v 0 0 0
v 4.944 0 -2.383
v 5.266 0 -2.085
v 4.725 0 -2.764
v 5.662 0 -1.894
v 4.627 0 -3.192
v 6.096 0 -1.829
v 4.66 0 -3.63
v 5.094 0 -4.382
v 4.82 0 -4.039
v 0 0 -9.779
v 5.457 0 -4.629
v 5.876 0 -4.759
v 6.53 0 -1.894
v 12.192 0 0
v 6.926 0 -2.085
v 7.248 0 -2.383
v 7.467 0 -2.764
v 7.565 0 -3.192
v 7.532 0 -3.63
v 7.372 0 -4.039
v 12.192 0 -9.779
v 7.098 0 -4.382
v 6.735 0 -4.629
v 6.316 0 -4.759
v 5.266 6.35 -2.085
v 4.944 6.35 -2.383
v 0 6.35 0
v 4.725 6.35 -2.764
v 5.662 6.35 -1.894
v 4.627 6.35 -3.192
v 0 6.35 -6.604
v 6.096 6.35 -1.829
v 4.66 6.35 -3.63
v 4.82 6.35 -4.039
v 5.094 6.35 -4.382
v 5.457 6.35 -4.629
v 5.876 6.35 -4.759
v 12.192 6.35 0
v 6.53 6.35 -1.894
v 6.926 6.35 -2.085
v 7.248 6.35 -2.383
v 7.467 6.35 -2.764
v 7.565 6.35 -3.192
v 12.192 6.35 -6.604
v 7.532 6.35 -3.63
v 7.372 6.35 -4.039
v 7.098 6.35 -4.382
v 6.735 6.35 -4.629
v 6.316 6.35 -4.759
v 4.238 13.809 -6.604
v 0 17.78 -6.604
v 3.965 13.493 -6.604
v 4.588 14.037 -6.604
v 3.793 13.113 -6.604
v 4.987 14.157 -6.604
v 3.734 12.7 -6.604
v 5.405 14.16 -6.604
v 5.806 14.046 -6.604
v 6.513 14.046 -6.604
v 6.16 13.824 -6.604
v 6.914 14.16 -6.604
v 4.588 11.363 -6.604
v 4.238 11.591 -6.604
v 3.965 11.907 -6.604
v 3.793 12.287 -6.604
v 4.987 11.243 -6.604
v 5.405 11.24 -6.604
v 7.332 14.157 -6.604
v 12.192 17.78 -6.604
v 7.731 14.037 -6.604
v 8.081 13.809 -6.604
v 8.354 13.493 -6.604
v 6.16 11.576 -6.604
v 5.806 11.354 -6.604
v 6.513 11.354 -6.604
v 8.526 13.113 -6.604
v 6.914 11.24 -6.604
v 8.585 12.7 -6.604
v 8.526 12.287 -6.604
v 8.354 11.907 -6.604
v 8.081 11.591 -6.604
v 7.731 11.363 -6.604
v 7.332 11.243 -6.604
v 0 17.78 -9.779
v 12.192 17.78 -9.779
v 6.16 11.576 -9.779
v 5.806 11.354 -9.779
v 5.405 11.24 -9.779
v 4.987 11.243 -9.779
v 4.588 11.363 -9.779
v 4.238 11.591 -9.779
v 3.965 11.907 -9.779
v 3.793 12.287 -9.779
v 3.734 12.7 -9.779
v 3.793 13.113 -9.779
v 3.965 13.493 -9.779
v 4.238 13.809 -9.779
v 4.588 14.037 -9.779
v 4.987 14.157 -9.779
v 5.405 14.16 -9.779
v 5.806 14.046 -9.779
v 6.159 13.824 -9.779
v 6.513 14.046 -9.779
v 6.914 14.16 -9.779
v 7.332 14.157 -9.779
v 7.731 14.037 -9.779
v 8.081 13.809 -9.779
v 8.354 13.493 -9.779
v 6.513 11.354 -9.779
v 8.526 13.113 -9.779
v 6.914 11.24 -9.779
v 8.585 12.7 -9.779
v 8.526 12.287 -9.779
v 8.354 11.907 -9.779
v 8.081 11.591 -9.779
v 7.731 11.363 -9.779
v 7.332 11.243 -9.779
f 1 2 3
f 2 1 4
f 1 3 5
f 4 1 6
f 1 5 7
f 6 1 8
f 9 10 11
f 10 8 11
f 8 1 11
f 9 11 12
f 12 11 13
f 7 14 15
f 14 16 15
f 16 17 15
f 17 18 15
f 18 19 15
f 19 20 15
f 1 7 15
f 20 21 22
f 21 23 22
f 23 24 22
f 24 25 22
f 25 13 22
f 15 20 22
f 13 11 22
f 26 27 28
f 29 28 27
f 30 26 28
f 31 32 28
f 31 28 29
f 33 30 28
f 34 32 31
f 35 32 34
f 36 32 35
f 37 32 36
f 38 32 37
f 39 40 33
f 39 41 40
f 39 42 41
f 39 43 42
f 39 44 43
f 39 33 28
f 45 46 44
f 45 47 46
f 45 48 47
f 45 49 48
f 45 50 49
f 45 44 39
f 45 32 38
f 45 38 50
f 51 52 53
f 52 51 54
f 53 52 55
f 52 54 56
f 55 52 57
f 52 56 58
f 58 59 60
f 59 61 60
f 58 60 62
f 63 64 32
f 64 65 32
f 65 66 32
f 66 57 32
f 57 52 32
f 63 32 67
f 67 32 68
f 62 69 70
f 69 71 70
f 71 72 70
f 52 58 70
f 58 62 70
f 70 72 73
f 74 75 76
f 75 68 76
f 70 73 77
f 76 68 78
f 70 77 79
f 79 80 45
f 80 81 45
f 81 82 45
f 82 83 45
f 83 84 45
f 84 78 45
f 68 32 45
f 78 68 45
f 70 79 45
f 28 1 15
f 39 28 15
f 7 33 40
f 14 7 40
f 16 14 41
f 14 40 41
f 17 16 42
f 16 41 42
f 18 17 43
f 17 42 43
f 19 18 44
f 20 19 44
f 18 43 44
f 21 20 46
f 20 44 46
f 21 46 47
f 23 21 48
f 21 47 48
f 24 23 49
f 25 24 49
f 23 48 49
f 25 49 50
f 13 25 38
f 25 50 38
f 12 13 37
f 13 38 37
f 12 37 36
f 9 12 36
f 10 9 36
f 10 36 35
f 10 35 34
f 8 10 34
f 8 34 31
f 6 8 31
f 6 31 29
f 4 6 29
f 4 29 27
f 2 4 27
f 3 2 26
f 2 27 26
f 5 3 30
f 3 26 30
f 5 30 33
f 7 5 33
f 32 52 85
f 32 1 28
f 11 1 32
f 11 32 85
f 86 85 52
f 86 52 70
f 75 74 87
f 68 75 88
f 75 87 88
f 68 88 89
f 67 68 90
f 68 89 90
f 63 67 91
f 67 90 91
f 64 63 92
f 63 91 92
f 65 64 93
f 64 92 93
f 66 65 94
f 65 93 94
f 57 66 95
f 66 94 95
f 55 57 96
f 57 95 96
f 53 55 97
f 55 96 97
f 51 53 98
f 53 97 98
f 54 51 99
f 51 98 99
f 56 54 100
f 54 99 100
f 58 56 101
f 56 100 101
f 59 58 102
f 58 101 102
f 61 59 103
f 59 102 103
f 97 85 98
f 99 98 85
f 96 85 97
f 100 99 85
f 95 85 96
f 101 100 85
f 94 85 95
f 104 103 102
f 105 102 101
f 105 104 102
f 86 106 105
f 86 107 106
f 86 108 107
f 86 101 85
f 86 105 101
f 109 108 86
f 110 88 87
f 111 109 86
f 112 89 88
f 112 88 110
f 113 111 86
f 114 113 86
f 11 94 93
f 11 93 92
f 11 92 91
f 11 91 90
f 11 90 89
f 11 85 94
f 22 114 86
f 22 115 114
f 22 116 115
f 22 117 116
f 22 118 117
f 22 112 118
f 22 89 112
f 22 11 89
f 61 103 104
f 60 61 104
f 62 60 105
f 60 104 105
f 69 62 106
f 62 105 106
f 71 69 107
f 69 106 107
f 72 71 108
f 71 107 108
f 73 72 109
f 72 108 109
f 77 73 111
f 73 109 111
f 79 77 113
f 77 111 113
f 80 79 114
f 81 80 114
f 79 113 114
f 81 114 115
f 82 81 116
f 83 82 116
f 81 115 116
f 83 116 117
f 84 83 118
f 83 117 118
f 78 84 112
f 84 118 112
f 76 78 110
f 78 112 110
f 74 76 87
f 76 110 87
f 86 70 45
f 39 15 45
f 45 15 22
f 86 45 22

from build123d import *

# Parameters (mm, degrees)
SKETCH1_W           = 12.192
SKETCH1_H           = 9.779
BOSS_EXTRUDE1_DEPTH = 6.35
SKETCH2_W           = 12.192
SKETCH2_H           = 3.175
BOSS_EXTRUDE2_DEPTH = 11.43
SKETCH3_R           = 1.4732
CUT_EXTRUDE2_DEPTH  = 6.35
SKETCH4_R           = 1.4732
CUT_EXTRUDE3_DEPTH  = 6.35
SKETCH5_R           = 1.4732
CUT_EXTRUDE4_DEPTH  = 6.35


with BuildPart() as part:
    # Sketch1 → Boss-Extrude1 (new body)
    with BuildSketch(Plane(origin=(0, 0, 0), x_dir=(1, 0, 0), z_dir=(0, 1, 0))):
        with Locations((6.096, 4.8895)):
            Rectangle(SKETCH1_W, SKETCH1_H)
    extrude(amount=BOSS_EXTRUDE1_DEPTH)

    # Sketch2 → Boss-Extrude2 (add)
    with BuildSketch(Plane(origin=(0, 6.35, 0), x_dir=(1, 0, 0), z_dir=(0, 1, 0))):
        with Locations((6.096, 8.1915)):
            Rectangle(SKETCH2_W, SKETCH2_H)
    extrude(amount=BOSS_EXTRUDE2_DEPTH)

    # Sketch3 → Cut-Extrude2 (cut)
    with BuildSketch(Plane(origin=(0, 6.35, 0), x_dir=(1, 0, 0), z_dir=(0, 1, 0))):
        with Locations((25.4, 3.302)):
            Circle(SKETCH3_R)
        with Locations(Location((6.096, 3.302, 0), (0, 0, 270))):
            Circle(SKETCH3_R)
    extrude(amount=-CUT_EXTRUDE2_DEPTH, mode=Mode.SUBTRACT)

    # Sketch4 → Cut-Extrude3 (cut)
    with BuildSketch(Plane(origin=(0, 0, -9.779), x_dir=(-1, 0, 0), z_dir=(0, 0, -1))):
        with Locations((-5.207, 12.7)):
            Circle(SKETCH4_R)
    extrude(amount=-CUT_EXTRUDE3_DEPTH, mode=Mode.SUBTRACT)

    # Sketch5 → Cut-Extrude4 (cut)
    with BuildSketch(Plane(origin=(0, 0, -9.779), x_dir=(-1, 0, 0), z_dir=(0, 0, -1))):
        with Locations((-7.112, 12.7)):
            Circle(SKETCH5_R)
    extrude(amount=-CUT_EXTRUDE4_DEPTH, mode=Mode.SUBTRACT)


solid = part.part
